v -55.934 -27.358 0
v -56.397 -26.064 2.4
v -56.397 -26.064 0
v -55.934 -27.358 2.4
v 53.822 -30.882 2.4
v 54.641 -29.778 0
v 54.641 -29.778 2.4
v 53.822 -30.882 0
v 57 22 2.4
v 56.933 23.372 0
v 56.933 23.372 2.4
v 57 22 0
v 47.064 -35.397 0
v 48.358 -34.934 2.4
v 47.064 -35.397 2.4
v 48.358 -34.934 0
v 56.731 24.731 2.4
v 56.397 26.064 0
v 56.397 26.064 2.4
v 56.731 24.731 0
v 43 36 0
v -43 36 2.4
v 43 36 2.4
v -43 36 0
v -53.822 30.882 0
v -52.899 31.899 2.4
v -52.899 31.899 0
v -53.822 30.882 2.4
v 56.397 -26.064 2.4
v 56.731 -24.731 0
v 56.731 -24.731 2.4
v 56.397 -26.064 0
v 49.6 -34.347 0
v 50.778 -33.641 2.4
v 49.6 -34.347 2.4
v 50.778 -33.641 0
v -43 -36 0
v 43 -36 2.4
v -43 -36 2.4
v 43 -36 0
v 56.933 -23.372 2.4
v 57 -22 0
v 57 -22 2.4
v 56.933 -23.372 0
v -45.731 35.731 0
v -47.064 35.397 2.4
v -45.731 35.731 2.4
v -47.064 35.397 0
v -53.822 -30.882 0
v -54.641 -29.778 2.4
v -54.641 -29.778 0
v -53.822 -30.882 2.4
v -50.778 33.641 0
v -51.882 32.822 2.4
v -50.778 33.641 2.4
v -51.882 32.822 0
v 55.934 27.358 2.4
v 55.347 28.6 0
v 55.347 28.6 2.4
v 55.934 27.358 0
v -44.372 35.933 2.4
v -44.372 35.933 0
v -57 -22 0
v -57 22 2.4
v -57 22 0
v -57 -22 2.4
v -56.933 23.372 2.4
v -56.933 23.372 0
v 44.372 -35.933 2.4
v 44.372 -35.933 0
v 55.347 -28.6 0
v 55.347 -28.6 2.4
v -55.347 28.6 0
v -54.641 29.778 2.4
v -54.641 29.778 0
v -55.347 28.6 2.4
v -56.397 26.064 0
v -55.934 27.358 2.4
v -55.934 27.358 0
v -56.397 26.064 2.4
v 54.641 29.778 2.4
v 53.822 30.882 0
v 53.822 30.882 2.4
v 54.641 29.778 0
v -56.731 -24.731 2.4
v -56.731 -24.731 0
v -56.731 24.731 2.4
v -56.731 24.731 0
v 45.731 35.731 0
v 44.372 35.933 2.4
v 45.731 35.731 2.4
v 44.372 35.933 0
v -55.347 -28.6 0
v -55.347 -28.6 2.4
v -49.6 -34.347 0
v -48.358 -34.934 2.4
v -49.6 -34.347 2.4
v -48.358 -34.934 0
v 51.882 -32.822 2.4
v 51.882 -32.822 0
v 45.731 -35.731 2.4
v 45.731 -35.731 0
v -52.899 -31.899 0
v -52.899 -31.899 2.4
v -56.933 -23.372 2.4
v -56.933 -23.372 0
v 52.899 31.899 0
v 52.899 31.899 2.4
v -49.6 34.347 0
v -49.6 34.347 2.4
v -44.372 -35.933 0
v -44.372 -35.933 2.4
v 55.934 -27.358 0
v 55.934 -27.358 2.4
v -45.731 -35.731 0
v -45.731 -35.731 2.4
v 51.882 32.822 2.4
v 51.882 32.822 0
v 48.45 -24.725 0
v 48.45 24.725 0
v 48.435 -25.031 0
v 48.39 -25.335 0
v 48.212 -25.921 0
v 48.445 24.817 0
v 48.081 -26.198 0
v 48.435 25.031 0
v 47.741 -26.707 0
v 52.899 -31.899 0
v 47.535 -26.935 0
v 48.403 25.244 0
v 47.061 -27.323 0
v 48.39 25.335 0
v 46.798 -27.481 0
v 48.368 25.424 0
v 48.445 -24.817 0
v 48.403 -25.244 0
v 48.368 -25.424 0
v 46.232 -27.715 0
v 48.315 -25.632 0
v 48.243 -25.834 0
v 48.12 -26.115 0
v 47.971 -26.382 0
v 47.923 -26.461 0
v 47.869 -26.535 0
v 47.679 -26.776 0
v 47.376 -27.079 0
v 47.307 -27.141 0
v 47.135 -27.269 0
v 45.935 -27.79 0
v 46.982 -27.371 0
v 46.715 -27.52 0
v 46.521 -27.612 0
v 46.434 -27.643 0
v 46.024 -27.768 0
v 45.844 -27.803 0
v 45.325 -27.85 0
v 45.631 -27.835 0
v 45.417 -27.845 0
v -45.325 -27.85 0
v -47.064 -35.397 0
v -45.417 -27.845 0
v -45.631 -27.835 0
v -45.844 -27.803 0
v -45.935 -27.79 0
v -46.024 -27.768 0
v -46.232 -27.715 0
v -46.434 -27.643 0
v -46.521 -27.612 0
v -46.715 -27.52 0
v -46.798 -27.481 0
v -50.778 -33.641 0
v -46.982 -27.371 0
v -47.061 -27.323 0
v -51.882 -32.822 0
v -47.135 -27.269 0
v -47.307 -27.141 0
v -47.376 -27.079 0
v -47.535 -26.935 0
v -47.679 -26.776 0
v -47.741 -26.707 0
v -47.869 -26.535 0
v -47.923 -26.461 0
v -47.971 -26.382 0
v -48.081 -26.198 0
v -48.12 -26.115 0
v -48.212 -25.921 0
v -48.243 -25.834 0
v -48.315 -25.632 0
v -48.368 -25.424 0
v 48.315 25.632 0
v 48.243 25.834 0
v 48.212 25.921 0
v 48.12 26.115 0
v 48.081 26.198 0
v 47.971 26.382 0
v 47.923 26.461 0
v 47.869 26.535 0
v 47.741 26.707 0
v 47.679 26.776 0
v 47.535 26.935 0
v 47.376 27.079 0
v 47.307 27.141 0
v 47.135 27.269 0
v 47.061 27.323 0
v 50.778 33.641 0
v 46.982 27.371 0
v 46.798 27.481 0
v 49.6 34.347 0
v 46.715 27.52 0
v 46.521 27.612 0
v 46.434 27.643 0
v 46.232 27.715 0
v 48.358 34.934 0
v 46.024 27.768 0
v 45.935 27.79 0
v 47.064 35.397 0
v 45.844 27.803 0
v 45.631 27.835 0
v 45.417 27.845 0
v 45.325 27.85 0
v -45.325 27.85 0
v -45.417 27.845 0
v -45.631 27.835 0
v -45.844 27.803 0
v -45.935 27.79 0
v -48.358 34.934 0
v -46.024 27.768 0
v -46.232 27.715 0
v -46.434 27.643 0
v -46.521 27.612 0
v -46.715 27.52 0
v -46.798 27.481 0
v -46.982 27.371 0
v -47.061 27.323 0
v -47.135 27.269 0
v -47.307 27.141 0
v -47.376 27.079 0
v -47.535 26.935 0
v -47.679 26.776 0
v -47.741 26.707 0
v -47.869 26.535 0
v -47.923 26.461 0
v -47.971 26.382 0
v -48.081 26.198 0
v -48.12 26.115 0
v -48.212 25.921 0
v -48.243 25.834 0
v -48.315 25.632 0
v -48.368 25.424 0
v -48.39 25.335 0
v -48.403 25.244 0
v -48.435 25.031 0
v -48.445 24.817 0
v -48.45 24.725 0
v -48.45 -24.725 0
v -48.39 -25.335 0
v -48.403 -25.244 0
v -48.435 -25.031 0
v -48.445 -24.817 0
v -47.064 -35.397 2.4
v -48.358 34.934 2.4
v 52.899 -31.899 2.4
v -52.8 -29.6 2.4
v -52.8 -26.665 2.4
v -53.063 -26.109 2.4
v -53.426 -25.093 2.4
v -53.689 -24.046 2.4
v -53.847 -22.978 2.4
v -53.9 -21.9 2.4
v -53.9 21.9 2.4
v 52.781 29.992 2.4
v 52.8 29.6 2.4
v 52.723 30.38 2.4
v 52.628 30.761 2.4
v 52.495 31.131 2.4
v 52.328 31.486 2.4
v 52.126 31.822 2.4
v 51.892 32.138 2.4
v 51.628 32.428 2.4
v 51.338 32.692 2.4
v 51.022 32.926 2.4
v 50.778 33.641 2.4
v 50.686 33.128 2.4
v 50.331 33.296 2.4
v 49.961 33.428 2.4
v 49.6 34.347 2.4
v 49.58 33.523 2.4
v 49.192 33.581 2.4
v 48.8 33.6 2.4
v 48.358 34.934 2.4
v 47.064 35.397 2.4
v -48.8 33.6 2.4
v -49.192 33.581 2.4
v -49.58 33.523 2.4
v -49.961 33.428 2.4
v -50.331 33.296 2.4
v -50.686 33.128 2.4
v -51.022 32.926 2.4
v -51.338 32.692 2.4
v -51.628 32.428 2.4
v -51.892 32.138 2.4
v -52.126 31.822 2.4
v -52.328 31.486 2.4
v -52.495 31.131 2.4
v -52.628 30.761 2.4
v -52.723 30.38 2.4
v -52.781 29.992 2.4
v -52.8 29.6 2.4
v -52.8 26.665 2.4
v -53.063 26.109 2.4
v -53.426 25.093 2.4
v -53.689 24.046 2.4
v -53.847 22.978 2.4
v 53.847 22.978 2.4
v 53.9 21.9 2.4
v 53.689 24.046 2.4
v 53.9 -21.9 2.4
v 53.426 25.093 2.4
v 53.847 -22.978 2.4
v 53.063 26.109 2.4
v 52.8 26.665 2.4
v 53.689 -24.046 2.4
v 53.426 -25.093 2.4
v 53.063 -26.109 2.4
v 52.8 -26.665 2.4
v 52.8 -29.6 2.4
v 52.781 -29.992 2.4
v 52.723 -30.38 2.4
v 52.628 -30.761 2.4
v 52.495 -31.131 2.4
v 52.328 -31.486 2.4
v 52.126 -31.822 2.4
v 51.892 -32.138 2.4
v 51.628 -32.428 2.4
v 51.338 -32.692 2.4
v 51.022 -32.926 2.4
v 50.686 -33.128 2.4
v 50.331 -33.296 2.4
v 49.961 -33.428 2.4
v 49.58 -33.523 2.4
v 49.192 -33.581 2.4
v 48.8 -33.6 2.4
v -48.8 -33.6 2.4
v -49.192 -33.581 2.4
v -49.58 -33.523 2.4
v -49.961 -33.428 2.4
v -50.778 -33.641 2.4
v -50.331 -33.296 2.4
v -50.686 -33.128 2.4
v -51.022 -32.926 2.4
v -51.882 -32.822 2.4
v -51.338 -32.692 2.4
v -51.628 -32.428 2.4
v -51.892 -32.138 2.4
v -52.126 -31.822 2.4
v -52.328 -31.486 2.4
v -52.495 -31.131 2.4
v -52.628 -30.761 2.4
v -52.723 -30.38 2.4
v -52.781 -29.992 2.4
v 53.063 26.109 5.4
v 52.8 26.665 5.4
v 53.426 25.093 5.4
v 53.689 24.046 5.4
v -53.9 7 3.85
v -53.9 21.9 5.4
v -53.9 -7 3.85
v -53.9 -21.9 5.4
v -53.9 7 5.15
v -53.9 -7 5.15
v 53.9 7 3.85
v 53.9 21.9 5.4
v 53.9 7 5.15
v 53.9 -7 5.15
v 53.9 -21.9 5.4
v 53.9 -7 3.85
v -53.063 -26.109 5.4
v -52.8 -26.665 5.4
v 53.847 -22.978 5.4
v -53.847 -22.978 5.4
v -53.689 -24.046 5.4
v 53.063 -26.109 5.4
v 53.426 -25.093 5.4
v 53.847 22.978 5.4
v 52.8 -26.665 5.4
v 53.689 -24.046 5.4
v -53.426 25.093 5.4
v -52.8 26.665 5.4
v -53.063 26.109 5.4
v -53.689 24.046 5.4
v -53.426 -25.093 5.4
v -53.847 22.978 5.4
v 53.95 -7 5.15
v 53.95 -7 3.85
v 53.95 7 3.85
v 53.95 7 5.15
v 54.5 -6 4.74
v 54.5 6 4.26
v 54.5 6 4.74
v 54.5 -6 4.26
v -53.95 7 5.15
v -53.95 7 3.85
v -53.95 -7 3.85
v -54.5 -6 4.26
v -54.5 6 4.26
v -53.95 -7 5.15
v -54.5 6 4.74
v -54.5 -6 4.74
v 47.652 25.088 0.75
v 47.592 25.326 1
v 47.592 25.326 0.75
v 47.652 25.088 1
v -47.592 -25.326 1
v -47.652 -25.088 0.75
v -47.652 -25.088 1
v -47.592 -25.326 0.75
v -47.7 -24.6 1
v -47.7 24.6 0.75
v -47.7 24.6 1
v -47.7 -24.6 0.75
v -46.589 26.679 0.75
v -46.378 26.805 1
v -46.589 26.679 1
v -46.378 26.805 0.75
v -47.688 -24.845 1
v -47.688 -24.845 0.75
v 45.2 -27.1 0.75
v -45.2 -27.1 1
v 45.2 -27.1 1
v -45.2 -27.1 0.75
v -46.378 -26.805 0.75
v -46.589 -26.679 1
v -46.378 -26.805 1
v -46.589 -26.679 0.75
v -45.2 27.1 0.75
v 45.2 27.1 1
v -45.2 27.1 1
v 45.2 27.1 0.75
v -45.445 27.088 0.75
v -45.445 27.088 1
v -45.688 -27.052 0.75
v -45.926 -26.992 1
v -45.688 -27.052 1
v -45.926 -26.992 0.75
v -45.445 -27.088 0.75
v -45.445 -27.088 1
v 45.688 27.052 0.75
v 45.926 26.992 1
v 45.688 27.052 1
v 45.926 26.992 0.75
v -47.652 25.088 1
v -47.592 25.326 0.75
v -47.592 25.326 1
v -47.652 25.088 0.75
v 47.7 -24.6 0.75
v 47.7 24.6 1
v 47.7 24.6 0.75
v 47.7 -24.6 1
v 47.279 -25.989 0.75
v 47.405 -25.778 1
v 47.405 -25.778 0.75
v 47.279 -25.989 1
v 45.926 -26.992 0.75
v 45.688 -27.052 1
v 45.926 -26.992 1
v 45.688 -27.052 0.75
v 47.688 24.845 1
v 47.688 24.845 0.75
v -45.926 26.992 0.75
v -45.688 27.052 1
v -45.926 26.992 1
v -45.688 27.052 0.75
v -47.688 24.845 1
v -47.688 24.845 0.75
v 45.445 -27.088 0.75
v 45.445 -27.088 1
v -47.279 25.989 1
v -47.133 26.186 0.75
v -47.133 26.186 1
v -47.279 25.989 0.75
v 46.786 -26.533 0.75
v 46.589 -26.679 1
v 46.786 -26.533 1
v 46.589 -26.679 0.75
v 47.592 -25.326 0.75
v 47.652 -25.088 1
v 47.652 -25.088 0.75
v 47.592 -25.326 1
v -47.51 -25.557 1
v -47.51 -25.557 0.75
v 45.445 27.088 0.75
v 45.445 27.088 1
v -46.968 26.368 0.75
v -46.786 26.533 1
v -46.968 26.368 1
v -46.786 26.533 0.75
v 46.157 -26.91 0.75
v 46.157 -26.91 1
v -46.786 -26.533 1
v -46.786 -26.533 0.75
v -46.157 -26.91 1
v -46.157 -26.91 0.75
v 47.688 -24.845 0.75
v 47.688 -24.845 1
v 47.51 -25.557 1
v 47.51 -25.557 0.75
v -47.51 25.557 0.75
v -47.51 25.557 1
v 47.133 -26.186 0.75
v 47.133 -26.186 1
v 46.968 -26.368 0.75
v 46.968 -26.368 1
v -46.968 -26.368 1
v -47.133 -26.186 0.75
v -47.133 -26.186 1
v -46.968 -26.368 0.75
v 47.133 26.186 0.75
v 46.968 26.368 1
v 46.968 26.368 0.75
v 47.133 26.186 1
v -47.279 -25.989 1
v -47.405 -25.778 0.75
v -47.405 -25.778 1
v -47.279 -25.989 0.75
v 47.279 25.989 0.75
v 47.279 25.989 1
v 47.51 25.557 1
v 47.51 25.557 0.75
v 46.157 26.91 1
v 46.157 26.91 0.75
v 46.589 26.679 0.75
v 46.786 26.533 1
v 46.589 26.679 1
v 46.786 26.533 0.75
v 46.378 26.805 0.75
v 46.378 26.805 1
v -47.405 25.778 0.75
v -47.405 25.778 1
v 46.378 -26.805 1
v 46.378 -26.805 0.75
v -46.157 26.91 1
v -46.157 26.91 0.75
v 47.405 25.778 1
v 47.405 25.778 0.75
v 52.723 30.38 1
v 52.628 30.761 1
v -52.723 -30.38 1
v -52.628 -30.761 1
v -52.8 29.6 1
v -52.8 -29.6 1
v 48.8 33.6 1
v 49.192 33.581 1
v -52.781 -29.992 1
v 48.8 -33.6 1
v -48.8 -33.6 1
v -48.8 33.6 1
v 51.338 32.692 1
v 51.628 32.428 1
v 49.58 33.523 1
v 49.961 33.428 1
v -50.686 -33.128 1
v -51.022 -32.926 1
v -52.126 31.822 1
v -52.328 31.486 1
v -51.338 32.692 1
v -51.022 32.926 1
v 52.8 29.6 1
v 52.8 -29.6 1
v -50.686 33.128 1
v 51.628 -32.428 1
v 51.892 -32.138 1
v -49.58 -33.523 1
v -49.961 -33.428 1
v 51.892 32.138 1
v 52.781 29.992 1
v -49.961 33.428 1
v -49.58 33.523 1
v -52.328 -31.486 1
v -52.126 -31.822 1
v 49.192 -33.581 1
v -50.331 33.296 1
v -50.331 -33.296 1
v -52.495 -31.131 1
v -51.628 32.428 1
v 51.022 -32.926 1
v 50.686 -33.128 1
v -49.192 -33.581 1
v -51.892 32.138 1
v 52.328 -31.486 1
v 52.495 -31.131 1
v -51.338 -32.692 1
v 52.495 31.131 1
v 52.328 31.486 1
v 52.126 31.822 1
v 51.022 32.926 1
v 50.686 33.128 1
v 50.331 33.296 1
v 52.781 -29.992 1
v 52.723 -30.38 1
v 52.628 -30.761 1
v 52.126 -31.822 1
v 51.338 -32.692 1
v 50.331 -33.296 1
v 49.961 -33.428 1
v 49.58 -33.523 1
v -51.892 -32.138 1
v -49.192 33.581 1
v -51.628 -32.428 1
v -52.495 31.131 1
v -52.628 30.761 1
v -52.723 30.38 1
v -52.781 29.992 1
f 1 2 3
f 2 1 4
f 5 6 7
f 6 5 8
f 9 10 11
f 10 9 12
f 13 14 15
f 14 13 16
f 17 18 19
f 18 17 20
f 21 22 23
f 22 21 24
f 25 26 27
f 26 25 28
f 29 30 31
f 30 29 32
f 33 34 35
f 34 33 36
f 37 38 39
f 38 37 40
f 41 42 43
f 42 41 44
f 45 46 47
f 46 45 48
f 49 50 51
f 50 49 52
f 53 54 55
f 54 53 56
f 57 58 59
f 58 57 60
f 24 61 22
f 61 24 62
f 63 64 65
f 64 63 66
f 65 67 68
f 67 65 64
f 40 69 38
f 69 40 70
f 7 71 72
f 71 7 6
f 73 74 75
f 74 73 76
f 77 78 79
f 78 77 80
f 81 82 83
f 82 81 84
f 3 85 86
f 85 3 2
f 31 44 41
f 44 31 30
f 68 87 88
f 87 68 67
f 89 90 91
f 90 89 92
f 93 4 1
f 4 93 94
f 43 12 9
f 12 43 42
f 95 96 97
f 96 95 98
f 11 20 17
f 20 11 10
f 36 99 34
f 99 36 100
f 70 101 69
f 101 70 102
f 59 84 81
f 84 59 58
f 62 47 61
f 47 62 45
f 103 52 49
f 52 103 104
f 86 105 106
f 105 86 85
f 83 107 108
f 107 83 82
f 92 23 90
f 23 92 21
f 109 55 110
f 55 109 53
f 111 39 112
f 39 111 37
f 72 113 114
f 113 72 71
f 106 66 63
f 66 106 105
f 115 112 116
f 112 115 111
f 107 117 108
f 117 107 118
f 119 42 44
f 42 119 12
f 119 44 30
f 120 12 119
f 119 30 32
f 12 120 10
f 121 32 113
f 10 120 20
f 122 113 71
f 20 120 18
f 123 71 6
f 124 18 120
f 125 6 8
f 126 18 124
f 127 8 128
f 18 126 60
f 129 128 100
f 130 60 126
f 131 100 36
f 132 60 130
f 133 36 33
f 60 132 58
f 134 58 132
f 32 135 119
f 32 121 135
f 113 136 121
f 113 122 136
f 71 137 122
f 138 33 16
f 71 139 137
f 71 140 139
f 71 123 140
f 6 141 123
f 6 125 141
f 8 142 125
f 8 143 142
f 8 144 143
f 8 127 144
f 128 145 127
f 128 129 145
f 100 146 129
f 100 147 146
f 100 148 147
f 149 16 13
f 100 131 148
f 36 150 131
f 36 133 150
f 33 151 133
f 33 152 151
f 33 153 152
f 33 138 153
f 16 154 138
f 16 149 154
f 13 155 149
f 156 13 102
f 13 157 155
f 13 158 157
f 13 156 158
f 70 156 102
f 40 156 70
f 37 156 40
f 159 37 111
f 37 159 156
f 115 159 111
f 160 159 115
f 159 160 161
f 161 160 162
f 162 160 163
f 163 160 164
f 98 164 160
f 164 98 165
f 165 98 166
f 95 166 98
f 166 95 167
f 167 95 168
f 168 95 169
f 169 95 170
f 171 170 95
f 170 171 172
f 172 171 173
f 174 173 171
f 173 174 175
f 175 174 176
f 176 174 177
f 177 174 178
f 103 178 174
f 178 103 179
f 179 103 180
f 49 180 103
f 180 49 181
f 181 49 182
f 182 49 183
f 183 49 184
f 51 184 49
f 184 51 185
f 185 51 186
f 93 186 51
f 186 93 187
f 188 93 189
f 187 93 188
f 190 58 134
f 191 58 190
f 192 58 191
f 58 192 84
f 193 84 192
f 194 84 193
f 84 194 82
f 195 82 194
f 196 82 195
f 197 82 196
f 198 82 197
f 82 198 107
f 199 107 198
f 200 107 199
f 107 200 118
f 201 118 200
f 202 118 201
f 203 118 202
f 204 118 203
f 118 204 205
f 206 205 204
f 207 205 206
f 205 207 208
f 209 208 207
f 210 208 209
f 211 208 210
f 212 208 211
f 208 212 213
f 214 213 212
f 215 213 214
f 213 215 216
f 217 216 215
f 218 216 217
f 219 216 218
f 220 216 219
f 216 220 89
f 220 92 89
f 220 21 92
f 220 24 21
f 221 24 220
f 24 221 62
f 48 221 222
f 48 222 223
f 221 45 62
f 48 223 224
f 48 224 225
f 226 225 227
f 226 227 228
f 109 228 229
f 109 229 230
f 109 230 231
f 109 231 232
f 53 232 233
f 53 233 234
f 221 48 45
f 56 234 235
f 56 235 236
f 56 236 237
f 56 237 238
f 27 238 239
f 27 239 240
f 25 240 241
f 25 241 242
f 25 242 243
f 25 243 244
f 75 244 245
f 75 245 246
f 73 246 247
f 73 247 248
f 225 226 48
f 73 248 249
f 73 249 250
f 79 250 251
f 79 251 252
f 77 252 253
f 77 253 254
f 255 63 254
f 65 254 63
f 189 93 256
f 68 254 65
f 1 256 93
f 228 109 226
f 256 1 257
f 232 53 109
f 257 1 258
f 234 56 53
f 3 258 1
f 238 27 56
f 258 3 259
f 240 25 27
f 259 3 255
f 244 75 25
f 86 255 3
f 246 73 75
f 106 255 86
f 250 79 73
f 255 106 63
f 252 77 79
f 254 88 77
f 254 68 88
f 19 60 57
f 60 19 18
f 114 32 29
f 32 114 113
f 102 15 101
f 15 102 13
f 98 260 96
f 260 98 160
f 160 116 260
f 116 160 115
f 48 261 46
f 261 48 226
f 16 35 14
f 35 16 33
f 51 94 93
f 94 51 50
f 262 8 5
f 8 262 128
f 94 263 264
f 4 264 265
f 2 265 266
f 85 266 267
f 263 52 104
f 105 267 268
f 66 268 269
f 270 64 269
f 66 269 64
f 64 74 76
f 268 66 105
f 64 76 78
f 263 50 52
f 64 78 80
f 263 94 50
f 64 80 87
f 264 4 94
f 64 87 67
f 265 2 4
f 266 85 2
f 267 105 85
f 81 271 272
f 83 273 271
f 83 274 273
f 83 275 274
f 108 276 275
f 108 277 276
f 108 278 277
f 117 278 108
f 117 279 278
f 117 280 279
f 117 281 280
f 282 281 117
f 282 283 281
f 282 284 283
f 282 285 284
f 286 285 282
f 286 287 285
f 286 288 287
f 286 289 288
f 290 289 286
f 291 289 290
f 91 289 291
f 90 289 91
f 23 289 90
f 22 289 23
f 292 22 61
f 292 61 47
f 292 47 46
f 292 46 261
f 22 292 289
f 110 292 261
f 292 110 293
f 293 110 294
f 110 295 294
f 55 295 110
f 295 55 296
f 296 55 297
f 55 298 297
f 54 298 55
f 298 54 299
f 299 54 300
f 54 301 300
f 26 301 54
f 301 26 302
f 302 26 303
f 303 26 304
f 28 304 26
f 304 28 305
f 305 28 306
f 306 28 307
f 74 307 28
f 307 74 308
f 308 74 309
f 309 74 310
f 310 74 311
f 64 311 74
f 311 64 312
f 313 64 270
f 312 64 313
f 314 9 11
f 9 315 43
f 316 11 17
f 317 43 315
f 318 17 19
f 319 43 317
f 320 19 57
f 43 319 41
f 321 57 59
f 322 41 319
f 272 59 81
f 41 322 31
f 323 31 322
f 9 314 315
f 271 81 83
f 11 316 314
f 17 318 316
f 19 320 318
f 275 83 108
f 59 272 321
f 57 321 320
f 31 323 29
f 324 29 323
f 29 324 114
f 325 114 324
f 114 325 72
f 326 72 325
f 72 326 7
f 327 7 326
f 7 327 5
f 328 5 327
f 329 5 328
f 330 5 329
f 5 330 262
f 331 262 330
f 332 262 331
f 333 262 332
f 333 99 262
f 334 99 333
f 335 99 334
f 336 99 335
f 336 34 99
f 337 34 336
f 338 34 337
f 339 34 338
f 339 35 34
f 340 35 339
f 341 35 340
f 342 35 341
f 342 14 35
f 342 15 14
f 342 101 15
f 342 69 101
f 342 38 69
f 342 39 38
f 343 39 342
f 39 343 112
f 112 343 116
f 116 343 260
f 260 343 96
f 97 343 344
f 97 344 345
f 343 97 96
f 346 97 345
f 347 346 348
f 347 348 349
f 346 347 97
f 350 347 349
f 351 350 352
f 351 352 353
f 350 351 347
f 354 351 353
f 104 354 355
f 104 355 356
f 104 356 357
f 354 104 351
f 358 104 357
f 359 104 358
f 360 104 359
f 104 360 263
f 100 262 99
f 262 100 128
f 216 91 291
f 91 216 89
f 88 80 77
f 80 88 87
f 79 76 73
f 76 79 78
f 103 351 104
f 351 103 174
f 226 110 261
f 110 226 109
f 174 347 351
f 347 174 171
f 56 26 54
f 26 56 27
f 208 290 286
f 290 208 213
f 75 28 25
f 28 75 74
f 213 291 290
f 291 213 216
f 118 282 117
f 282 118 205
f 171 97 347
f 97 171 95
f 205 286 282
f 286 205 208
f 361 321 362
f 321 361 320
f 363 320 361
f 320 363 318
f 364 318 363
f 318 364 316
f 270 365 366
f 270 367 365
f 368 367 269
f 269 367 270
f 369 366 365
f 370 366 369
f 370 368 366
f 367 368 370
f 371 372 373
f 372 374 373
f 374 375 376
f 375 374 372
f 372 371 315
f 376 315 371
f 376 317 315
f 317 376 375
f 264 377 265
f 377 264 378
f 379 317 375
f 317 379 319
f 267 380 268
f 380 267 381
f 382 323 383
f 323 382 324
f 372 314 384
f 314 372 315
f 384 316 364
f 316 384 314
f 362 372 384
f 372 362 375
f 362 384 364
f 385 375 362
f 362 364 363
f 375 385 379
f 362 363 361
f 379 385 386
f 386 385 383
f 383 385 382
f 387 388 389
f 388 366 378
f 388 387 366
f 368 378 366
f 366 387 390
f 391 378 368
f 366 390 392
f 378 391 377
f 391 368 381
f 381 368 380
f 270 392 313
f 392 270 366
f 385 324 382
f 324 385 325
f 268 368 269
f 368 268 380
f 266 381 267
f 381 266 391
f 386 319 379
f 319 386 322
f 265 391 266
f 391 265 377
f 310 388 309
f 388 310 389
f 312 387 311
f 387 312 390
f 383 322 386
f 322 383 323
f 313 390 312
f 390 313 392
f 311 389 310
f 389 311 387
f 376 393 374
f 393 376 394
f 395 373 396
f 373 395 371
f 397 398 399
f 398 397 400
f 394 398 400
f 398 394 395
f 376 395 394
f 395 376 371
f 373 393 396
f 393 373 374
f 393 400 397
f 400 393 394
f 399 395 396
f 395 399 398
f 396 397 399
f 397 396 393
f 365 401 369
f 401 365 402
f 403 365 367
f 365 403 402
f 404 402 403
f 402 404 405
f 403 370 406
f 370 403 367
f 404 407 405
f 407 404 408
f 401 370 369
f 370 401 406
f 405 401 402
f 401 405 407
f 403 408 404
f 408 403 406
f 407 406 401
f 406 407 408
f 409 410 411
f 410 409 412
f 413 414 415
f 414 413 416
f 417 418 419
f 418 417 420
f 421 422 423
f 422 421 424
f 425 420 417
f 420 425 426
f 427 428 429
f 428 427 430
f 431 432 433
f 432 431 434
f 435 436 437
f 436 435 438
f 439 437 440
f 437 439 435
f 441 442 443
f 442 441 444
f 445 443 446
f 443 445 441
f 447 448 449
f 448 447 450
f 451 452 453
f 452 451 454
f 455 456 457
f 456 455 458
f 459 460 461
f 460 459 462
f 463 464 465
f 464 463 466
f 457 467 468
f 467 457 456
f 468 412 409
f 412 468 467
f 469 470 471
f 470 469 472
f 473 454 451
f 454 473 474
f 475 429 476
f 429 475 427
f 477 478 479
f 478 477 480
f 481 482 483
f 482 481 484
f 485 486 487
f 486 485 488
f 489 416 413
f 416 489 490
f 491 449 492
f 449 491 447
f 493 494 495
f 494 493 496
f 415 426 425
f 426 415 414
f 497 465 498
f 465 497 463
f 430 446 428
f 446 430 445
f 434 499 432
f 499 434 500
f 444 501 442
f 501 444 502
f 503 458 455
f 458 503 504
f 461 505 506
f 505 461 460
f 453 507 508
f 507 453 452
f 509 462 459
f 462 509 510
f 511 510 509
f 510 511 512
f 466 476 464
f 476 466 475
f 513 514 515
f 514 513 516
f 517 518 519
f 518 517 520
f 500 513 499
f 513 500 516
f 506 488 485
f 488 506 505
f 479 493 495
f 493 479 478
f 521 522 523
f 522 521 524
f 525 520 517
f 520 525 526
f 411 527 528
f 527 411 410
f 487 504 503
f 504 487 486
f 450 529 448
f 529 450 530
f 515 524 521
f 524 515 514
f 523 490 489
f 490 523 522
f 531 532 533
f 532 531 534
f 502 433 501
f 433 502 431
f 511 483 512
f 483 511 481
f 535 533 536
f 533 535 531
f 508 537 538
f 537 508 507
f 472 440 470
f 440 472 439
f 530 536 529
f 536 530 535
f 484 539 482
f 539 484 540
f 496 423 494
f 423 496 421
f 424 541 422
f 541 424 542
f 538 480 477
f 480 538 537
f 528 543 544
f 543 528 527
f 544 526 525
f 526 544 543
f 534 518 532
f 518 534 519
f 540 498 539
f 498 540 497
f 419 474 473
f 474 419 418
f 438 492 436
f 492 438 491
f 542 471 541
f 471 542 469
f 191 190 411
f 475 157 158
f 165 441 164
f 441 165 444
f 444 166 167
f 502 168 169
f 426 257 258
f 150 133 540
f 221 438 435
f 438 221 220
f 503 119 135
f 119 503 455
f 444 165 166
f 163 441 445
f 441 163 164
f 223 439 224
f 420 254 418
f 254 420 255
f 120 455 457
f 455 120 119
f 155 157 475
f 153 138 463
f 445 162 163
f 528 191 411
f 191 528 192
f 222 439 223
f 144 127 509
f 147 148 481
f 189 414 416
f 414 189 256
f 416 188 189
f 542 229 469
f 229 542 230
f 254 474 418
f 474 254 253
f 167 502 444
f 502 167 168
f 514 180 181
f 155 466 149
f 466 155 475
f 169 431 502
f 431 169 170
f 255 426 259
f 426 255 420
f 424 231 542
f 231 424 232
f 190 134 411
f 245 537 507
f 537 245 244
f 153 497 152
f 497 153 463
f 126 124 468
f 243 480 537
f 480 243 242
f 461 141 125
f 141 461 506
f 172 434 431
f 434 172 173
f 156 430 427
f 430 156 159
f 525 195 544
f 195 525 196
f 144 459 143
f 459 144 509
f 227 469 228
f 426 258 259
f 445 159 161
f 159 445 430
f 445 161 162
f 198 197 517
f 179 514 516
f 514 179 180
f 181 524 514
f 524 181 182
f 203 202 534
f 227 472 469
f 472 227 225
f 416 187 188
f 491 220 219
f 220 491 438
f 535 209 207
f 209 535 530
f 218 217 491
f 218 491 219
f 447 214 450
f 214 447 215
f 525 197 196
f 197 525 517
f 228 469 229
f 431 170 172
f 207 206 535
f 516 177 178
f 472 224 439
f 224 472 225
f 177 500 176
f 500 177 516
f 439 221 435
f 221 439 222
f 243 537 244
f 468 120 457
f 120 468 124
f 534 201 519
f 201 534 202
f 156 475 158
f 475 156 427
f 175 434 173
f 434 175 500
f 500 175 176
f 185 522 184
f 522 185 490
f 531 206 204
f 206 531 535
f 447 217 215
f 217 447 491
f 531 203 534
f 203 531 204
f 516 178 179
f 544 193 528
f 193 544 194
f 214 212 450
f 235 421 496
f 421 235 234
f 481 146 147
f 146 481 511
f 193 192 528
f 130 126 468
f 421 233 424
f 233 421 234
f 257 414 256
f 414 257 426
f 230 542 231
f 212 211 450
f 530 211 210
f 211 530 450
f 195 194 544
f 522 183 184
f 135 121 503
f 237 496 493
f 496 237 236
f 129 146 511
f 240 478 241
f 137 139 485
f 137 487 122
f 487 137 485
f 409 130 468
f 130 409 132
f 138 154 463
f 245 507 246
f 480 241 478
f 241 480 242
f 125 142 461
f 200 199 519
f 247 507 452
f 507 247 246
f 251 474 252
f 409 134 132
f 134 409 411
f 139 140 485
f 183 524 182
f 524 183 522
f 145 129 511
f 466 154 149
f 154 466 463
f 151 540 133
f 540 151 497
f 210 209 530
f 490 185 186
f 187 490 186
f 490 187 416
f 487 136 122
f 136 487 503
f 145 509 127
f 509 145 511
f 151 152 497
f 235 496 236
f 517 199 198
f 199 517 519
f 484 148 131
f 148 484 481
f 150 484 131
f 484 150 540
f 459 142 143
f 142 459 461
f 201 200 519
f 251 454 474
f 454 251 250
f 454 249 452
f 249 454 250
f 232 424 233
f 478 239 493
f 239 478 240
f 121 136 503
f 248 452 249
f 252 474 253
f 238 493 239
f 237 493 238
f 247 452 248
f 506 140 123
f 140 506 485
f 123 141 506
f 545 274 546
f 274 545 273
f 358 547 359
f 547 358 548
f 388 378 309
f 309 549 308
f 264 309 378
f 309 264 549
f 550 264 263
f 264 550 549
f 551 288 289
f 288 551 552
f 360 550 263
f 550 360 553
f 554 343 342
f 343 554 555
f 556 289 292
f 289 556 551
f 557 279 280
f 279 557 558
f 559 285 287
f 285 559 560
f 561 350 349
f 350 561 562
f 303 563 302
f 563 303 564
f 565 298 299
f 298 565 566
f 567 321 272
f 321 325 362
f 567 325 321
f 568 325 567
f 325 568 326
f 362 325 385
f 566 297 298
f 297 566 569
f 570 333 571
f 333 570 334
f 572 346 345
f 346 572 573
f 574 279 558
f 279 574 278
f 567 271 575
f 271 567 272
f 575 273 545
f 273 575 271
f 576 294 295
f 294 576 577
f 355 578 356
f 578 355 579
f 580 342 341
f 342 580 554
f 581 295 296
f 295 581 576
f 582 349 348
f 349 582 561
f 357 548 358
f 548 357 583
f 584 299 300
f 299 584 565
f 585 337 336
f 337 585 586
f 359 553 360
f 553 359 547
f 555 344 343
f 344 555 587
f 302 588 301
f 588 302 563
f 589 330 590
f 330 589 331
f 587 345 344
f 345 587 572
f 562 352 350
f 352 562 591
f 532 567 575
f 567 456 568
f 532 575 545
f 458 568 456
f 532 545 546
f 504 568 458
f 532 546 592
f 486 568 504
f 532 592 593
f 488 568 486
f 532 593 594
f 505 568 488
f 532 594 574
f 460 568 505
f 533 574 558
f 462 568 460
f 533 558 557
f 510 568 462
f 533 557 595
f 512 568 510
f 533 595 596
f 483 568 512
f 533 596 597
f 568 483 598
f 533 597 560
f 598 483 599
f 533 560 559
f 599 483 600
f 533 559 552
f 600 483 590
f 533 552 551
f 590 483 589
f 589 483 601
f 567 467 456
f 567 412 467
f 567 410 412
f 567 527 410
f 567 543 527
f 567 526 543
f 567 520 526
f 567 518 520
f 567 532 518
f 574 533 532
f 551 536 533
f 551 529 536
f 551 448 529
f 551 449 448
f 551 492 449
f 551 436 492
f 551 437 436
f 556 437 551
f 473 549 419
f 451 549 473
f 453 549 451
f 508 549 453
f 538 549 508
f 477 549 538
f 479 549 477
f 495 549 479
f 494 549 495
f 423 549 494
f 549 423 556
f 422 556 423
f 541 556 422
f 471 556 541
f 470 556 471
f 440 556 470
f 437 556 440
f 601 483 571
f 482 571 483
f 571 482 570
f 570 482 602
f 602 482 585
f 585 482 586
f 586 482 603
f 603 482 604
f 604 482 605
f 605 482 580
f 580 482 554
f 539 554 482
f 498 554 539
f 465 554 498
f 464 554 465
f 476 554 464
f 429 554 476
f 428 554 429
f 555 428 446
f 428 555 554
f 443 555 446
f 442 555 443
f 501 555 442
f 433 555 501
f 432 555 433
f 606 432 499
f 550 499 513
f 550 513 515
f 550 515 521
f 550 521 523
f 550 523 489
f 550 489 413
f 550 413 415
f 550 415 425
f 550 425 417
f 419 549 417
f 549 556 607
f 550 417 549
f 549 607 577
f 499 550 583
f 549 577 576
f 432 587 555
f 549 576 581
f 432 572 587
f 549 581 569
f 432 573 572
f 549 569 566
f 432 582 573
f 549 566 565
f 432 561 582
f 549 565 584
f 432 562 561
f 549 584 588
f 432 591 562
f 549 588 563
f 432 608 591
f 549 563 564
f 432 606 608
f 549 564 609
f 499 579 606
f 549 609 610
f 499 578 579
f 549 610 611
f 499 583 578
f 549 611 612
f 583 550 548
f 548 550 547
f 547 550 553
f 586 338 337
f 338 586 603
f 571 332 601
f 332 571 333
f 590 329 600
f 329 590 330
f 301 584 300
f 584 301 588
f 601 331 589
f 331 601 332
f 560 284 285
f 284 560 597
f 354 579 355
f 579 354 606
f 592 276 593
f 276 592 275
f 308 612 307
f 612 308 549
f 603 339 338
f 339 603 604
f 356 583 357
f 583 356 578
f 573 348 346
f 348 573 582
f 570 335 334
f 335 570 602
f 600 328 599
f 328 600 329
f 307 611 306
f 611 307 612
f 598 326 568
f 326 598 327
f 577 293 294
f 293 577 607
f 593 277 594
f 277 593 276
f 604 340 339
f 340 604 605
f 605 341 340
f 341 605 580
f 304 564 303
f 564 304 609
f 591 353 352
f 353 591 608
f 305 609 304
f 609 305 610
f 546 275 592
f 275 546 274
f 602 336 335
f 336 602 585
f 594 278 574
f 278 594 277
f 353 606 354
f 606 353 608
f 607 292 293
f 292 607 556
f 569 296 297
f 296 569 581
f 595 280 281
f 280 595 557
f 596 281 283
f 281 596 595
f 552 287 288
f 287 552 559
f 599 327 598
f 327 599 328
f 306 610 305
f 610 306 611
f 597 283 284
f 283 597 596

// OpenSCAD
$fn = 64;

// =====================================================================
// MOLDURA FRONTAL GLICOMETER PRO - ECRÃ ULTRA-AMPLO DE 4.3 POLEGADAS
// 1. Frente 114 x 72 mm com bordas ultra-finas de ~4.5mm (Bezel-less moderno)
// 2. Janela ativa visível: 95.4 x 54.2 mm (Área total do ecrã 4.3" 800x480)
// 3. Recesso cego para o vidro do ecrã (105.5 x 67.2 mm x 1.6mm)
// 4. Aba Macho perimetral contínua com 4 dentes Snap-Fit para fecho audível
// 5. Face visível 100% lisa, sem fendas nem buracos passantes
// =====================================================================

larg_f = 114.0;
alt_f  = 72.0;
r_f    = 14.0;

esp_frontal = 2.4;  // espessura da face visível
macho_len   = 3.0;  // altura da aba de inserção

larg_m = 107.8;     // tolerância calibrada para o corpo
alt_m  = 65.8;
r_m    = 11.0;

// NOVA JANELA ATIVA DE 4.3 POLEGADAS (800x480)
janela_w = 95.4;
janela_h = 54.2;
janela_x = 0.0;

// Recesso traseiro para o vidro do ecrã 4.3" (105.5 x 67.2 mm)
vidro_w    = 105.6;
vidro_h    = 67.2;
prof_vidro = 1.4;

module rounded_rect(w, h, r) {
    minkowski() {
        square([max(0.1, w - 2*r), max(0.1, h - 2*r)], center=true);
        circle(r=r);
    }
}

// Dente snap com rampa suave de entrada (45 graus) e travamento mecânico positivo
module dente_snap_macho(w=14.0, h=1.2, proj=0.55) {
    hull() {
        cube([0.1, w, 0.1], center=true);
        translate([proj, 0, h*0.5])
        cube([0.1, w - 2.0, h*0.4], center=true);
        translate([0, 0, h])
        cube([0.1, w, 0.1], center=true);
    }
}

module moldura_43_impressao() {
    snap_w     = 14.0;
    snap_h     = 1.2;
    snap_proj  = 0.55;
    snap_z_pos = 1.5;

    difference() {
        union() {
            // 1. Placa Frontal Macica e 100% continua (Z=0 na mesa PEI)
            linear_extrude(esp_frontal, center=false)
            rounded_rect(larg_f, alt_f, r_f);

            // 2. Aba Macho perimetral continua a 360 graus
            translate([0, 0, esp_frontal])
            linear_extrude(macho_len, center=false)
            rounded_rect(larg_m, alt_m, r_m);

            // Dentes Snap de travamento mecânico nas 4 faces
            translate([larg_m/2, 0, esp_frontal + snap_z_pos])
            dente_snap_macho(snap_w, snap_h, snap_proj);

            translate([-larg_m/2, 0, esp_frontal + snap_z_pos])
            rotate([0, 0, 180])
            dente_snap_macho(snap_w, snap_h, snap_proj);

            translate([0, alt_m/2, esp_frontal + snap_z_pos])
            rotate([0, 0, 90])
            dente_snap_macho(snap_w, snap_h, snap_proj);

            translate([0, -alt_m/2, esp_frontal + snap_z_pos])
            rotate([0, 0, -90])
            dente_snap_macho(snap_w, snap_h, snap_proj);
        }

        // --- SUBTRACOES ---

        // A. Janela Ultra-Ampla de Visualização (4.3 Polegadas)
        translate([janela_x, 0, -0.5])
        linear_extrude(esp_frontal + 1.0, center=false)
        rounded_rect(janela_w, janela_h, 2.5);

        // B. Bisel elegante a 45 graus na face frontal
        translate([janela_x, 0, -0.5])
        hull() {
            translate([0, 0, 0])
            linear_extrude(0.1, center=true)
            rounded_rect(janela_w + 2.4, janela_h + 2.4, 3.5);

            translate([0, 0, 1.2])
            linear_extrude(0.1, center=true)
            rounded_rect(janela_w, janela_h, 2.5);
        }

        // C. Recesso cego para o vidro e margens do módulo 4.3"
        translate([0, 0, esp_frontal - prof_vidro])
        linear_extrude(prof_vidro + macho_len + 5.0, center=false)
        rounded_rect(vidro_w, vidro_h, 4.0);
    }
}

moldura_43_impressao();
